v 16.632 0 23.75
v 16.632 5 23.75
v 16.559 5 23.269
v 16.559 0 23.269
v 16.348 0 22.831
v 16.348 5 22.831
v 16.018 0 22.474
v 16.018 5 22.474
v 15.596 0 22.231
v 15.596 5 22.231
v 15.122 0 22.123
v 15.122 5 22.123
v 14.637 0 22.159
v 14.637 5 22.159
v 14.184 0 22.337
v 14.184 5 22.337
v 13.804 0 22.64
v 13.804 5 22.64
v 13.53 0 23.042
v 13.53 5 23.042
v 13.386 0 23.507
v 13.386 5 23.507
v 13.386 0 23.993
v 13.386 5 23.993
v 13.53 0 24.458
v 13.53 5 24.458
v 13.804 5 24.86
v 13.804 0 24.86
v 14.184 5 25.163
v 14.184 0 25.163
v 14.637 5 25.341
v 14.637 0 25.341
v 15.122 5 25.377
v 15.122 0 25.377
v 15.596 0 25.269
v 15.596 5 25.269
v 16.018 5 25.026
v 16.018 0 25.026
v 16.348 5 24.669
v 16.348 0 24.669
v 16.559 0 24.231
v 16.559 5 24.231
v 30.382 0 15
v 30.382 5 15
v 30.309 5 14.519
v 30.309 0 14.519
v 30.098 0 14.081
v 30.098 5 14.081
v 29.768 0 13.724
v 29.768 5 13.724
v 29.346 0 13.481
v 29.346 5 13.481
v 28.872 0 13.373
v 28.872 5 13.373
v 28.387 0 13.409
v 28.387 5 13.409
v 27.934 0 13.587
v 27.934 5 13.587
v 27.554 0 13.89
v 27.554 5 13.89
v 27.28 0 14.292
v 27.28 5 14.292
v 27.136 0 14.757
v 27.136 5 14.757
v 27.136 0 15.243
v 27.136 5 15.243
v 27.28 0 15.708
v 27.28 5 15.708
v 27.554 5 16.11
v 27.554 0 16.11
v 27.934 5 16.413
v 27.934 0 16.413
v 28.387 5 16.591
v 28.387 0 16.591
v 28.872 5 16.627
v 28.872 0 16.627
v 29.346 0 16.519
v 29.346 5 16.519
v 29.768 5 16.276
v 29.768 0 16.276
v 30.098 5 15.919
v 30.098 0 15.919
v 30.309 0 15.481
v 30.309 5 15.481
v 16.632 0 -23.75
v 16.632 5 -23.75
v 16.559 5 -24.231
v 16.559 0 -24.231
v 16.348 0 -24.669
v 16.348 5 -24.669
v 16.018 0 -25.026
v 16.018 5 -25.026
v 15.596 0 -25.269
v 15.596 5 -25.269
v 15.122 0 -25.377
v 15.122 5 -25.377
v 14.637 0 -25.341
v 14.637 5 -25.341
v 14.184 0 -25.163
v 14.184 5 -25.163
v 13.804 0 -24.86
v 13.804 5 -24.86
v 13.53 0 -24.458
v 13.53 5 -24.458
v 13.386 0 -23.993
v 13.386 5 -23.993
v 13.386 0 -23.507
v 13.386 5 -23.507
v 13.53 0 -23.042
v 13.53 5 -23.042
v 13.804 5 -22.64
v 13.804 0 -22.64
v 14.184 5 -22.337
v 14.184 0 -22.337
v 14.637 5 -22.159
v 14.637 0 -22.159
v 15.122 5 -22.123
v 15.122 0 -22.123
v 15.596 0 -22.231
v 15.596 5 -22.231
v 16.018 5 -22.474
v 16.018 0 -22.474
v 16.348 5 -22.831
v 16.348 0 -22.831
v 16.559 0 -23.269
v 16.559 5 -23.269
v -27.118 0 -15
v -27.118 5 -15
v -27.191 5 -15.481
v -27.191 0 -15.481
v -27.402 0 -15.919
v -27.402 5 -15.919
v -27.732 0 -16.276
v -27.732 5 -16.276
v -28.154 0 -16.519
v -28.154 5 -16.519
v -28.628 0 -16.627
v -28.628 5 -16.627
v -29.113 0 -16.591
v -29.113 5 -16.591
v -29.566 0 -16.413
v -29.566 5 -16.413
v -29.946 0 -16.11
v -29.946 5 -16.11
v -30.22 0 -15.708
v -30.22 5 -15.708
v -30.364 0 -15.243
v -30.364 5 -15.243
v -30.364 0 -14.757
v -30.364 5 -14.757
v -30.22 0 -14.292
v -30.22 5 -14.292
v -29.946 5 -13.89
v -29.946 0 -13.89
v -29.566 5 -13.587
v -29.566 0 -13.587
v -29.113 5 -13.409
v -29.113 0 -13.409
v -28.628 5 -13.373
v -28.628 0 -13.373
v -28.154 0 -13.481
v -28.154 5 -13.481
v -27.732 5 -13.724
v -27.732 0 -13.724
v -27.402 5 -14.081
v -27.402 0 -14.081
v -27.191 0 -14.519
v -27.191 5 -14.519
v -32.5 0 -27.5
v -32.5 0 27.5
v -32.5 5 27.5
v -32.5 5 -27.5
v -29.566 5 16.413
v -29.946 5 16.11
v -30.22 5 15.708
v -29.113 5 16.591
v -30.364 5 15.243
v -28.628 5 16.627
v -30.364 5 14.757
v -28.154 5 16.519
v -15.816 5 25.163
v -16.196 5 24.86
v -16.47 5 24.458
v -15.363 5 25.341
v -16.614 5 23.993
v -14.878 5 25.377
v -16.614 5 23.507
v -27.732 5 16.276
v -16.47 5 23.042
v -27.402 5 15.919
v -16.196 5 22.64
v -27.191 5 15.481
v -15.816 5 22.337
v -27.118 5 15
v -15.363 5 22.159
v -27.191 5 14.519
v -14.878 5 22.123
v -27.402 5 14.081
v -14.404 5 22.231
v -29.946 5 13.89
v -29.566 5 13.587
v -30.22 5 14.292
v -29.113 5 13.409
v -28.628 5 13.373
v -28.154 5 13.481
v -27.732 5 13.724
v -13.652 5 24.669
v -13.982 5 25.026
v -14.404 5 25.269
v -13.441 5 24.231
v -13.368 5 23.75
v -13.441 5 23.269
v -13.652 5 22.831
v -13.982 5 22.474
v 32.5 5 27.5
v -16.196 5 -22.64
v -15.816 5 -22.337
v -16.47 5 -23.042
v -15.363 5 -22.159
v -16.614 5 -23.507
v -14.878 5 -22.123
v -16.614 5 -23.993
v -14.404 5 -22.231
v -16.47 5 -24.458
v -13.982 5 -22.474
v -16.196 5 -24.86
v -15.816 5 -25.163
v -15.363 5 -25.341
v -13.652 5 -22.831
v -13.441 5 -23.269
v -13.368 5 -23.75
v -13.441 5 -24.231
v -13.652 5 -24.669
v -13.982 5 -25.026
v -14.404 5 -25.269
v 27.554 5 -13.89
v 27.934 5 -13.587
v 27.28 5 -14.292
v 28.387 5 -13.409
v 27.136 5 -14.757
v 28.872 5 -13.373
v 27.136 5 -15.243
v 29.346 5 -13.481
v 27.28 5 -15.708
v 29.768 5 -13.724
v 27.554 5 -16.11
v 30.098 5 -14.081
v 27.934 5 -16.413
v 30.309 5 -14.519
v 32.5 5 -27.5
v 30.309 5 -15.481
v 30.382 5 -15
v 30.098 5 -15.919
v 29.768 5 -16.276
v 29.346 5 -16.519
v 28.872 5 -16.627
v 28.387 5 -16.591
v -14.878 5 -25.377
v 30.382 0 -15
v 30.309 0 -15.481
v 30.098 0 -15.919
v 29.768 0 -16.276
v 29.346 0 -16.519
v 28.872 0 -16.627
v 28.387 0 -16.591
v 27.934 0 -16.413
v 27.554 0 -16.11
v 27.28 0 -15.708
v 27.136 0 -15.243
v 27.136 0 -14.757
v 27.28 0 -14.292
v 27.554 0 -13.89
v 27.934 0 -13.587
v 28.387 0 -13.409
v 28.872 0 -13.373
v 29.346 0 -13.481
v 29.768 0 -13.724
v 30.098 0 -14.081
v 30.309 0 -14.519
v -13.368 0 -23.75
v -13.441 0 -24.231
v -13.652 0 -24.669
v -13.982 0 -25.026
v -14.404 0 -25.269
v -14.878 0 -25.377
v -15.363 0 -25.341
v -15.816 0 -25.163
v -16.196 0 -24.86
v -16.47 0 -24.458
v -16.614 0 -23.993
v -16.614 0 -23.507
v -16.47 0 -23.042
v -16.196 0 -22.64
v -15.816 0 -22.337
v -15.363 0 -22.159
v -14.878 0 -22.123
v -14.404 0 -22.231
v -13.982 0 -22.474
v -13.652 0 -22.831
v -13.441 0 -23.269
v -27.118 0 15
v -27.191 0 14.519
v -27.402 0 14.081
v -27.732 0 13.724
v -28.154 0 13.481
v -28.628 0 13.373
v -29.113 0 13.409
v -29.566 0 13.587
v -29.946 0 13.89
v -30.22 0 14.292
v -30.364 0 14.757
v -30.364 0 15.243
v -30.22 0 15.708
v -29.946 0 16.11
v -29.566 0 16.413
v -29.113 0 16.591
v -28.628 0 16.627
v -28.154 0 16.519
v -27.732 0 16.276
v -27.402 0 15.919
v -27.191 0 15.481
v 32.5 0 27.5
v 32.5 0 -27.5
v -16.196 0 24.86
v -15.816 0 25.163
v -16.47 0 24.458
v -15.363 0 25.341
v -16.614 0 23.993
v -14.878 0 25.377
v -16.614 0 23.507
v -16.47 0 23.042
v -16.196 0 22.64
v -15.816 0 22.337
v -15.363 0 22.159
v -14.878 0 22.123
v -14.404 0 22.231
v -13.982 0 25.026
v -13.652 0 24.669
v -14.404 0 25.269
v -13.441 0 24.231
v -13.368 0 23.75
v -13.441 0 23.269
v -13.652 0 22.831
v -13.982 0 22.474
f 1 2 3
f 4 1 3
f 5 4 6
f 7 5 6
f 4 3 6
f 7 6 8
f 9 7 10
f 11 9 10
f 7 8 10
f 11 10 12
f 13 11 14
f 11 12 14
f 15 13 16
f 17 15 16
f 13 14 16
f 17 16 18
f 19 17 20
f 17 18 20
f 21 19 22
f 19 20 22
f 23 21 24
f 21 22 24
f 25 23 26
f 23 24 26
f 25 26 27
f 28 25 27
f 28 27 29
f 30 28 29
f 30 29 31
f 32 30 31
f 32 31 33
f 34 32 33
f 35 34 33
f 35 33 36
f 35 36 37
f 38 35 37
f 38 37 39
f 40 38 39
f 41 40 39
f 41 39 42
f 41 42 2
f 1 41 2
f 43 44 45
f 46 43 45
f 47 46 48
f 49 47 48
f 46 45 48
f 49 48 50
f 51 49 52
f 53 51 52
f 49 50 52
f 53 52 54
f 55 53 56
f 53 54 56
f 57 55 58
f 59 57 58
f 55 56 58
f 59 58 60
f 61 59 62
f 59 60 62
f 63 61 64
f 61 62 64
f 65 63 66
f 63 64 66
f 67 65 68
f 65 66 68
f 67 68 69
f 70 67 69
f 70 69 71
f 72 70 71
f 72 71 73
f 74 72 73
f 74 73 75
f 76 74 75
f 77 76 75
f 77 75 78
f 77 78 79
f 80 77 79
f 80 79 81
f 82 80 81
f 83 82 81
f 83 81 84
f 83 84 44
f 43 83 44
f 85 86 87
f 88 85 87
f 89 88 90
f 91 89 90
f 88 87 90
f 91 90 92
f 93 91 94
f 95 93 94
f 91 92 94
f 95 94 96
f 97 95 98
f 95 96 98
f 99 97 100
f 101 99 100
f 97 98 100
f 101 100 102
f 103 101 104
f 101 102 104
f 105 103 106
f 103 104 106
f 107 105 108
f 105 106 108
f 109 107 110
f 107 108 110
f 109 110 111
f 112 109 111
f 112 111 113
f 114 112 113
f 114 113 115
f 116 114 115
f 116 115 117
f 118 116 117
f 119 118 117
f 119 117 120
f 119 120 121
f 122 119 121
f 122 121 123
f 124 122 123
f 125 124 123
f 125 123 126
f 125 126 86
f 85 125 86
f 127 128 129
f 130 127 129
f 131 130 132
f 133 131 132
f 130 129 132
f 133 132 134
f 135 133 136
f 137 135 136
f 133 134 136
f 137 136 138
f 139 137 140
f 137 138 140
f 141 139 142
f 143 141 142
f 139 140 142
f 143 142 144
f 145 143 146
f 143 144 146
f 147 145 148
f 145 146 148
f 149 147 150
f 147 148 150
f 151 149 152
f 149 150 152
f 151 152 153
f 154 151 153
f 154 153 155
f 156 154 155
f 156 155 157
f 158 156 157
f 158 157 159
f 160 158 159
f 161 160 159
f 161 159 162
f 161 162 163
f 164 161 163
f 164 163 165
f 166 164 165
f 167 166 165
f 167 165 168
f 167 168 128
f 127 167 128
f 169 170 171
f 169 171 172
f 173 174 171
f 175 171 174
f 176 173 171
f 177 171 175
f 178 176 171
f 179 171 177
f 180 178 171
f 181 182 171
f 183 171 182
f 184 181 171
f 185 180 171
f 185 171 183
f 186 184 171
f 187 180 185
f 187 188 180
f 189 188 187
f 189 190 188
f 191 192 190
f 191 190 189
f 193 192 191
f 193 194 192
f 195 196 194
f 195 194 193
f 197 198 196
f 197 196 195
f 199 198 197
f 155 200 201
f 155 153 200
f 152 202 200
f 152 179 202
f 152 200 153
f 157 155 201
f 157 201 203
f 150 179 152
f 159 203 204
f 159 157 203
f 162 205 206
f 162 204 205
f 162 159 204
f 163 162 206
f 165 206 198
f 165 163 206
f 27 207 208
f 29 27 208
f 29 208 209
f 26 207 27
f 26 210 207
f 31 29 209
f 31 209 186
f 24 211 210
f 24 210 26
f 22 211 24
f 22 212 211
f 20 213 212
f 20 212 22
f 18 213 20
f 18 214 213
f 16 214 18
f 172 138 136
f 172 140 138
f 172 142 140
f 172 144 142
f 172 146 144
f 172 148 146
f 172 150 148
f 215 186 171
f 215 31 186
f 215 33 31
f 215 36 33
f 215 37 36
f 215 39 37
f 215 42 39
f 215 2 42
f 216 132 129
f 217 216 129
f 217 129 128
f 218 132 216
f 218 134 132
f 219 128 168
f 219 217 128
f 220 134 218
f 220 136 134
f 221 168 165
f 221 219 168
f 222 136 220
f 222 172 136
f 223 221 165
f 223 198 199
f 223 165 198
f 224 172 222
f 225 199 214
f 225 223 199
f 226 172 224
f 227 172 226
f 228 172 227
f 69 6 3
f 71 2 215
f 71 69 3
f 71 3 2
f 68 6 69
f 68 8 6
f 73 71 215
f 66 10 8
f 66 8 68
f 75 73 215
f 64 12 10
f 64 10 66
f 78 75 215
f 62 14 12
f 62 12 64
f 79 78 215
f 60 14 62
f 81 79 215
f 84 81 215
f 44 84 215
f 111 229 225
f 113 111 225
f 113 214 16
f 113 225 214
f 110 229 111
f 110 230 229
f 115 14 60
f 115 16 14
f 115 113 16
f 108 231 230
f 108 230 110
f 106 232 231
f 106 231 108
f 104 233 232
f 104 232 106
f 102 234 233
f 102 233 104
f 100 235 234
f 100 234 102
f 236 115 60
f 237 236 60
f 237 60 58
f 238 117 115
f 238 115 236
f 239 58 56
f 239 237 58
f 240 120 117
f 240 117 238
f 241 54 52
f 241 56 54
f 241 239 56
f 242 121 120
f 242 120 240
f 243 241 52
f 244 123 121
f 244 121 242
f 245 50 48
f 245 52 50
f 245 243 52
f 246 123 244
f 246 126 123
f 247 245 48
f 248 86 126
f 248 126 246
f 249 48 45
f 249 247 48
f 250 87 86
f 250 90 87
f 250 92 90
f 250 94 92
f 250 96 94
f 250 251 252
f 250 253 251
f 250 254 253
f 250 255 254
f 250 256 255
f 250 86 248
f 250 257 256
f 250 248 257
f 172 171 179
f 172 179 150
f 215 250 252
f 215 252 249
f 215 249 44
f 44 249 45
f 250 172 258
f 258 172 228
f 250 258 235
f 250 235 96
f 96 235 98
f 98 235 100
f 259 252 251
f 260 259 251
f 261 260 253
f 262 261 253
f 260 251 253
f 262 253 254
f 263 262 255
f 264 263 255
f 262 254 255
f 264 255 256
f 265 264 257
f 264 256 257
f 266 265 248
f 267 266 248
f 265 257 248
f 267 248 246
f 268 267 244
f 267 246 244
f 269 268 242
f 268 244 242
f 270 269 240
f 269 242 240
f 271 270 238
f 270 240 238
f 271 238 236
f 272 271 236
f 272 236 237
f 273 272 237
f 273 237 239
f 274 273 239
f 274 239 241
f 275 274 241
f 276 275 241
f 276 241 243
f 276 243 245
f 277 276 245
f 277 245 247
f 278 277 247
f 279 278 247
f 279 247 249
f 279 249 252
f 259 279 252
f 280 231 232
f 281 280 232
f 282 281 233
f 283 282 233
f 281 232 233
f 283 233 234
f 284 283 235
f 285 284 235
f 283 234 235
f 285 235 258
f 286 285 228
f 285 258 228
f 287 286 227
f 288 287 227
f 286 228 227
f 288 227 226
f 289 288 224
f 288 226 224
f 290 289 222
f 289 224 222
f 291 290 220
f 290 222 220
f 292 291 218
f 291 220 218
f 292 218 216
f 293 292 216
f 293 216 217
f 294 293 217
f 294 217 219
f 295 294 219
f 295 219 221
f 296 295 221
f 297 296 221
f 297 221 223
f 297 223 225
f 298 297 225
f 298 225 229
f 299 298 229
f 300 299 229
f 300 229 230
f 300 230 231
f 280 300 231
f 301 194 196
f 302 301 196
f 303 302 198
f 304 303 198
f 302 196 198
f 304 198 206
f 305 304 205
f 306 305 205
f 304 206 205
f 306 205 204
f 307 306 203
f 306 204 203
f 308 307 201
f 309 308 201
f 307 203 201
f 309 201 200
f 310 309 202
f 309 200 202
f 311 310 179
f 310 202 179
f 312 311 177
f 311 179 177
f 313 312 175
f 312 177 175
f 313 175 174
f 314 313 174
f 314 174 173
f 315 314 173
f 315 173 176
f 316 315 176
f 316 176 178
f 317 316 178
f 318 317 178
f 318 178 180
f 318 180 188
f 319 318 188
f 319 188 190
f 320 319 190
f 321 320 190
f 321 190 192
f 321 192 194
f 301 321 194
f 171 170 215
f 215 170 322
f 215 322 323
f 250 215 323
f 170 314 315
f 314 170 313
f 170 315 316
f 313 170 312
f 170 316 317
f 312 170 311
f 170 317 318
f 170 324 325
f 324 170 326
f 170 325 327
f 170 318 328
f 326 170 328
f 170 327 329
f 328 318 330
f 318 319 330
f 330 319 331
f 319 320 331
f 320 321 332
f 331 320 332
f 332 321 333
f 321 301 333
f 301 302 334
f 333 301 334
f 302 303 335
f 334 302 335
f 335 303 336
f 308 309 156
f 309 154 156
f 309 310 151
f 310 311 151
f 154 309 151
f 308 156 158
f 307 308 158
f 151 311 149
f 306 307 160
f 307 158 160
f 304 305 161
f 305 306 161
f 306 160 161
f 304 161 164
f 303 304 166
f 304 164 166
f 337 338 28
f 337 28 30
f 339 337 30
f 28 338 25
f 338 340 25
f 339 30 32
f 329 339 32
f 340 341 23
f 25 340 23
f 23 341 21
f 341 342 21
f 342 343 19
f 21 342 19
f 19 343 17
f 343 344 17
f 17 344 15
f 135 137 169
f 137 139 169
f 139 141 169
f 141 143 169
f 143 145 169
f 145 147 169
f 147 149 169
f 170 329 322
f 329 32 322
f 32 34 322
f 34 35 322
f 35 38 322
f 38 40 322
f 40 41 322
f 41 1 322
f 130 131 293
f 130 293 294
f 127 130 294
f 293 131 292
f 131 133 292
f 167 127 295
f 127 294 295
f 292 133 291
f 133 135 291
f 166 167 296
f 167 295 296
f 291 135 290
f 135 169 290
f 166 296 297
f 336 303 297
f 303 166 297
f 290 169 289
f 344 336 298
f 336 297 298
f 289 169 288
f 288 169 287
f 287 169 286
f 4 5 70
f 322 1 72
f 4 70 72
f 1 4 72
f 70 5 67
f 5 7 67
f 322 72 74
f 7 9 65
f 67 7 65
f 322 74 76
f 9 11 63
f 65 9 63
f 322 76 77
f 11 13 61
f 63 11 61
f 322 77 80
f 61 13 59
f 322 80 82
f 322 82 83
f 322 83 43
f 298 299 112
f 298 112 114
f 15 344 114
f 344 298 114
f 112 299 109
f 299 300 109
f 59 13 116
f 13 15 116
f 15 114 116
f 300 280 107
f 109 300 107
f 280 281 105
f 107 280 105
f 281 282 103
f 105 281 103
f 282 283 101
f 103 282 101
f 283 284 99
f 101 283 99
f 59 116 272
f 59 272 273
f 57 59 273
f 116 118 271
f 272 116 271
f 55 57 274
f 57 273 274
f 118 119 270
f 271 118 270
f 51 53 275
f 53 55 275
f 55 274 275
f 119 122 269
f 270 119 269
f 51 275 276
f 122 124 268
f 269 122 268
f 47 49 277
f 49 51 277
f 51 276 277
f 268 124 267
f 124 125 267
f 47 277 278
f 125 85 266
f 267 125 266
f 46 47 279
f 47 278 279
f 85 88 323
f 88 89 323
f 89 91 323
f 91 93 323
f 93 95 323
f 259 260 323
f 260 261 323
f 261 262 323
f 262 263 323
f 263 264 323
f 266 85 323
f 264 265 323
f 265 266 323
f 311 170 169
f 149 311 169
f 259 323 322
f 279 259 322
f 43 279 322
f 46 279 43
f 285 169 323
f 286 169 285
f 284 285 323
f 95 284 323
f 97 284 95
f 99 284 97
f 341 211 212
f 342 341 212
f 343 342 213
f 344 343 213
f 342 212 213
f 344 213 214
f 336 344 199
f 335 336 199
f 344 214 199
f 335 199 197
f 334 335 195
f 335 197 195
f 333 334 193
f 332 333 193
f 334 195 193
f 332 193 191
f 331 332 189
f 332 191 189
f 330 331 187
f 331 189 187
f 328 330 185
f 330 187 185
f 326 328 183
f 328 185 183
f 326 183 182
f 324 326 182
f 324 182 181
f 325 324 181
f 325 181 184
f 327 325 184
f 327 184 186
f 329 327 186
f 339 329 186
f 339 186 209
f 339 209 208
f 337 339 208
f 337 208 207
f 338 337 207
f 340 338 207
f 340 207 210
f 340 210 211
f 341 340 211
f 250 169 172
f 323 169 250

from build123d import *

# Parameters (mm, degrees)
SKETCH2_W             = 65
SKETCH2_H             = 55
BOSS_EXTRUDE1_DEPTH   = 5
F_4_CLEARANCE_HOLE1_D = 3.2639


with BuildPart() as part:
    # Sketch2 → Boss-Extrude1 (new body)
    with BuildSketch(Plane(origin=(0, 0, 0), x_dir=(1, 0, 0), z_dir=(0, 1, 0))):
        Rectangle(SKETCH2_W, SKETCH2_H)
    extrude(amount=BOSS_EXTRUDE1_DEPTH)

    # #4 Clearance Hole1 (through all)
    with Locations(Plane(origin=(0, 0, 0), x_dir=(-1, 0, 0), z_dir=(0, -1, 0))):
        with Locations((-28.75, 15), (-15, 23.75), (15, 23.75), (28.75, 15), (28.75, -15), (15, -23.75), (-15, -23.75), (-28.75, -15)):
            Hole(F_4_CLEARANCE_HOLE1_D / 2)


solid = part.part
